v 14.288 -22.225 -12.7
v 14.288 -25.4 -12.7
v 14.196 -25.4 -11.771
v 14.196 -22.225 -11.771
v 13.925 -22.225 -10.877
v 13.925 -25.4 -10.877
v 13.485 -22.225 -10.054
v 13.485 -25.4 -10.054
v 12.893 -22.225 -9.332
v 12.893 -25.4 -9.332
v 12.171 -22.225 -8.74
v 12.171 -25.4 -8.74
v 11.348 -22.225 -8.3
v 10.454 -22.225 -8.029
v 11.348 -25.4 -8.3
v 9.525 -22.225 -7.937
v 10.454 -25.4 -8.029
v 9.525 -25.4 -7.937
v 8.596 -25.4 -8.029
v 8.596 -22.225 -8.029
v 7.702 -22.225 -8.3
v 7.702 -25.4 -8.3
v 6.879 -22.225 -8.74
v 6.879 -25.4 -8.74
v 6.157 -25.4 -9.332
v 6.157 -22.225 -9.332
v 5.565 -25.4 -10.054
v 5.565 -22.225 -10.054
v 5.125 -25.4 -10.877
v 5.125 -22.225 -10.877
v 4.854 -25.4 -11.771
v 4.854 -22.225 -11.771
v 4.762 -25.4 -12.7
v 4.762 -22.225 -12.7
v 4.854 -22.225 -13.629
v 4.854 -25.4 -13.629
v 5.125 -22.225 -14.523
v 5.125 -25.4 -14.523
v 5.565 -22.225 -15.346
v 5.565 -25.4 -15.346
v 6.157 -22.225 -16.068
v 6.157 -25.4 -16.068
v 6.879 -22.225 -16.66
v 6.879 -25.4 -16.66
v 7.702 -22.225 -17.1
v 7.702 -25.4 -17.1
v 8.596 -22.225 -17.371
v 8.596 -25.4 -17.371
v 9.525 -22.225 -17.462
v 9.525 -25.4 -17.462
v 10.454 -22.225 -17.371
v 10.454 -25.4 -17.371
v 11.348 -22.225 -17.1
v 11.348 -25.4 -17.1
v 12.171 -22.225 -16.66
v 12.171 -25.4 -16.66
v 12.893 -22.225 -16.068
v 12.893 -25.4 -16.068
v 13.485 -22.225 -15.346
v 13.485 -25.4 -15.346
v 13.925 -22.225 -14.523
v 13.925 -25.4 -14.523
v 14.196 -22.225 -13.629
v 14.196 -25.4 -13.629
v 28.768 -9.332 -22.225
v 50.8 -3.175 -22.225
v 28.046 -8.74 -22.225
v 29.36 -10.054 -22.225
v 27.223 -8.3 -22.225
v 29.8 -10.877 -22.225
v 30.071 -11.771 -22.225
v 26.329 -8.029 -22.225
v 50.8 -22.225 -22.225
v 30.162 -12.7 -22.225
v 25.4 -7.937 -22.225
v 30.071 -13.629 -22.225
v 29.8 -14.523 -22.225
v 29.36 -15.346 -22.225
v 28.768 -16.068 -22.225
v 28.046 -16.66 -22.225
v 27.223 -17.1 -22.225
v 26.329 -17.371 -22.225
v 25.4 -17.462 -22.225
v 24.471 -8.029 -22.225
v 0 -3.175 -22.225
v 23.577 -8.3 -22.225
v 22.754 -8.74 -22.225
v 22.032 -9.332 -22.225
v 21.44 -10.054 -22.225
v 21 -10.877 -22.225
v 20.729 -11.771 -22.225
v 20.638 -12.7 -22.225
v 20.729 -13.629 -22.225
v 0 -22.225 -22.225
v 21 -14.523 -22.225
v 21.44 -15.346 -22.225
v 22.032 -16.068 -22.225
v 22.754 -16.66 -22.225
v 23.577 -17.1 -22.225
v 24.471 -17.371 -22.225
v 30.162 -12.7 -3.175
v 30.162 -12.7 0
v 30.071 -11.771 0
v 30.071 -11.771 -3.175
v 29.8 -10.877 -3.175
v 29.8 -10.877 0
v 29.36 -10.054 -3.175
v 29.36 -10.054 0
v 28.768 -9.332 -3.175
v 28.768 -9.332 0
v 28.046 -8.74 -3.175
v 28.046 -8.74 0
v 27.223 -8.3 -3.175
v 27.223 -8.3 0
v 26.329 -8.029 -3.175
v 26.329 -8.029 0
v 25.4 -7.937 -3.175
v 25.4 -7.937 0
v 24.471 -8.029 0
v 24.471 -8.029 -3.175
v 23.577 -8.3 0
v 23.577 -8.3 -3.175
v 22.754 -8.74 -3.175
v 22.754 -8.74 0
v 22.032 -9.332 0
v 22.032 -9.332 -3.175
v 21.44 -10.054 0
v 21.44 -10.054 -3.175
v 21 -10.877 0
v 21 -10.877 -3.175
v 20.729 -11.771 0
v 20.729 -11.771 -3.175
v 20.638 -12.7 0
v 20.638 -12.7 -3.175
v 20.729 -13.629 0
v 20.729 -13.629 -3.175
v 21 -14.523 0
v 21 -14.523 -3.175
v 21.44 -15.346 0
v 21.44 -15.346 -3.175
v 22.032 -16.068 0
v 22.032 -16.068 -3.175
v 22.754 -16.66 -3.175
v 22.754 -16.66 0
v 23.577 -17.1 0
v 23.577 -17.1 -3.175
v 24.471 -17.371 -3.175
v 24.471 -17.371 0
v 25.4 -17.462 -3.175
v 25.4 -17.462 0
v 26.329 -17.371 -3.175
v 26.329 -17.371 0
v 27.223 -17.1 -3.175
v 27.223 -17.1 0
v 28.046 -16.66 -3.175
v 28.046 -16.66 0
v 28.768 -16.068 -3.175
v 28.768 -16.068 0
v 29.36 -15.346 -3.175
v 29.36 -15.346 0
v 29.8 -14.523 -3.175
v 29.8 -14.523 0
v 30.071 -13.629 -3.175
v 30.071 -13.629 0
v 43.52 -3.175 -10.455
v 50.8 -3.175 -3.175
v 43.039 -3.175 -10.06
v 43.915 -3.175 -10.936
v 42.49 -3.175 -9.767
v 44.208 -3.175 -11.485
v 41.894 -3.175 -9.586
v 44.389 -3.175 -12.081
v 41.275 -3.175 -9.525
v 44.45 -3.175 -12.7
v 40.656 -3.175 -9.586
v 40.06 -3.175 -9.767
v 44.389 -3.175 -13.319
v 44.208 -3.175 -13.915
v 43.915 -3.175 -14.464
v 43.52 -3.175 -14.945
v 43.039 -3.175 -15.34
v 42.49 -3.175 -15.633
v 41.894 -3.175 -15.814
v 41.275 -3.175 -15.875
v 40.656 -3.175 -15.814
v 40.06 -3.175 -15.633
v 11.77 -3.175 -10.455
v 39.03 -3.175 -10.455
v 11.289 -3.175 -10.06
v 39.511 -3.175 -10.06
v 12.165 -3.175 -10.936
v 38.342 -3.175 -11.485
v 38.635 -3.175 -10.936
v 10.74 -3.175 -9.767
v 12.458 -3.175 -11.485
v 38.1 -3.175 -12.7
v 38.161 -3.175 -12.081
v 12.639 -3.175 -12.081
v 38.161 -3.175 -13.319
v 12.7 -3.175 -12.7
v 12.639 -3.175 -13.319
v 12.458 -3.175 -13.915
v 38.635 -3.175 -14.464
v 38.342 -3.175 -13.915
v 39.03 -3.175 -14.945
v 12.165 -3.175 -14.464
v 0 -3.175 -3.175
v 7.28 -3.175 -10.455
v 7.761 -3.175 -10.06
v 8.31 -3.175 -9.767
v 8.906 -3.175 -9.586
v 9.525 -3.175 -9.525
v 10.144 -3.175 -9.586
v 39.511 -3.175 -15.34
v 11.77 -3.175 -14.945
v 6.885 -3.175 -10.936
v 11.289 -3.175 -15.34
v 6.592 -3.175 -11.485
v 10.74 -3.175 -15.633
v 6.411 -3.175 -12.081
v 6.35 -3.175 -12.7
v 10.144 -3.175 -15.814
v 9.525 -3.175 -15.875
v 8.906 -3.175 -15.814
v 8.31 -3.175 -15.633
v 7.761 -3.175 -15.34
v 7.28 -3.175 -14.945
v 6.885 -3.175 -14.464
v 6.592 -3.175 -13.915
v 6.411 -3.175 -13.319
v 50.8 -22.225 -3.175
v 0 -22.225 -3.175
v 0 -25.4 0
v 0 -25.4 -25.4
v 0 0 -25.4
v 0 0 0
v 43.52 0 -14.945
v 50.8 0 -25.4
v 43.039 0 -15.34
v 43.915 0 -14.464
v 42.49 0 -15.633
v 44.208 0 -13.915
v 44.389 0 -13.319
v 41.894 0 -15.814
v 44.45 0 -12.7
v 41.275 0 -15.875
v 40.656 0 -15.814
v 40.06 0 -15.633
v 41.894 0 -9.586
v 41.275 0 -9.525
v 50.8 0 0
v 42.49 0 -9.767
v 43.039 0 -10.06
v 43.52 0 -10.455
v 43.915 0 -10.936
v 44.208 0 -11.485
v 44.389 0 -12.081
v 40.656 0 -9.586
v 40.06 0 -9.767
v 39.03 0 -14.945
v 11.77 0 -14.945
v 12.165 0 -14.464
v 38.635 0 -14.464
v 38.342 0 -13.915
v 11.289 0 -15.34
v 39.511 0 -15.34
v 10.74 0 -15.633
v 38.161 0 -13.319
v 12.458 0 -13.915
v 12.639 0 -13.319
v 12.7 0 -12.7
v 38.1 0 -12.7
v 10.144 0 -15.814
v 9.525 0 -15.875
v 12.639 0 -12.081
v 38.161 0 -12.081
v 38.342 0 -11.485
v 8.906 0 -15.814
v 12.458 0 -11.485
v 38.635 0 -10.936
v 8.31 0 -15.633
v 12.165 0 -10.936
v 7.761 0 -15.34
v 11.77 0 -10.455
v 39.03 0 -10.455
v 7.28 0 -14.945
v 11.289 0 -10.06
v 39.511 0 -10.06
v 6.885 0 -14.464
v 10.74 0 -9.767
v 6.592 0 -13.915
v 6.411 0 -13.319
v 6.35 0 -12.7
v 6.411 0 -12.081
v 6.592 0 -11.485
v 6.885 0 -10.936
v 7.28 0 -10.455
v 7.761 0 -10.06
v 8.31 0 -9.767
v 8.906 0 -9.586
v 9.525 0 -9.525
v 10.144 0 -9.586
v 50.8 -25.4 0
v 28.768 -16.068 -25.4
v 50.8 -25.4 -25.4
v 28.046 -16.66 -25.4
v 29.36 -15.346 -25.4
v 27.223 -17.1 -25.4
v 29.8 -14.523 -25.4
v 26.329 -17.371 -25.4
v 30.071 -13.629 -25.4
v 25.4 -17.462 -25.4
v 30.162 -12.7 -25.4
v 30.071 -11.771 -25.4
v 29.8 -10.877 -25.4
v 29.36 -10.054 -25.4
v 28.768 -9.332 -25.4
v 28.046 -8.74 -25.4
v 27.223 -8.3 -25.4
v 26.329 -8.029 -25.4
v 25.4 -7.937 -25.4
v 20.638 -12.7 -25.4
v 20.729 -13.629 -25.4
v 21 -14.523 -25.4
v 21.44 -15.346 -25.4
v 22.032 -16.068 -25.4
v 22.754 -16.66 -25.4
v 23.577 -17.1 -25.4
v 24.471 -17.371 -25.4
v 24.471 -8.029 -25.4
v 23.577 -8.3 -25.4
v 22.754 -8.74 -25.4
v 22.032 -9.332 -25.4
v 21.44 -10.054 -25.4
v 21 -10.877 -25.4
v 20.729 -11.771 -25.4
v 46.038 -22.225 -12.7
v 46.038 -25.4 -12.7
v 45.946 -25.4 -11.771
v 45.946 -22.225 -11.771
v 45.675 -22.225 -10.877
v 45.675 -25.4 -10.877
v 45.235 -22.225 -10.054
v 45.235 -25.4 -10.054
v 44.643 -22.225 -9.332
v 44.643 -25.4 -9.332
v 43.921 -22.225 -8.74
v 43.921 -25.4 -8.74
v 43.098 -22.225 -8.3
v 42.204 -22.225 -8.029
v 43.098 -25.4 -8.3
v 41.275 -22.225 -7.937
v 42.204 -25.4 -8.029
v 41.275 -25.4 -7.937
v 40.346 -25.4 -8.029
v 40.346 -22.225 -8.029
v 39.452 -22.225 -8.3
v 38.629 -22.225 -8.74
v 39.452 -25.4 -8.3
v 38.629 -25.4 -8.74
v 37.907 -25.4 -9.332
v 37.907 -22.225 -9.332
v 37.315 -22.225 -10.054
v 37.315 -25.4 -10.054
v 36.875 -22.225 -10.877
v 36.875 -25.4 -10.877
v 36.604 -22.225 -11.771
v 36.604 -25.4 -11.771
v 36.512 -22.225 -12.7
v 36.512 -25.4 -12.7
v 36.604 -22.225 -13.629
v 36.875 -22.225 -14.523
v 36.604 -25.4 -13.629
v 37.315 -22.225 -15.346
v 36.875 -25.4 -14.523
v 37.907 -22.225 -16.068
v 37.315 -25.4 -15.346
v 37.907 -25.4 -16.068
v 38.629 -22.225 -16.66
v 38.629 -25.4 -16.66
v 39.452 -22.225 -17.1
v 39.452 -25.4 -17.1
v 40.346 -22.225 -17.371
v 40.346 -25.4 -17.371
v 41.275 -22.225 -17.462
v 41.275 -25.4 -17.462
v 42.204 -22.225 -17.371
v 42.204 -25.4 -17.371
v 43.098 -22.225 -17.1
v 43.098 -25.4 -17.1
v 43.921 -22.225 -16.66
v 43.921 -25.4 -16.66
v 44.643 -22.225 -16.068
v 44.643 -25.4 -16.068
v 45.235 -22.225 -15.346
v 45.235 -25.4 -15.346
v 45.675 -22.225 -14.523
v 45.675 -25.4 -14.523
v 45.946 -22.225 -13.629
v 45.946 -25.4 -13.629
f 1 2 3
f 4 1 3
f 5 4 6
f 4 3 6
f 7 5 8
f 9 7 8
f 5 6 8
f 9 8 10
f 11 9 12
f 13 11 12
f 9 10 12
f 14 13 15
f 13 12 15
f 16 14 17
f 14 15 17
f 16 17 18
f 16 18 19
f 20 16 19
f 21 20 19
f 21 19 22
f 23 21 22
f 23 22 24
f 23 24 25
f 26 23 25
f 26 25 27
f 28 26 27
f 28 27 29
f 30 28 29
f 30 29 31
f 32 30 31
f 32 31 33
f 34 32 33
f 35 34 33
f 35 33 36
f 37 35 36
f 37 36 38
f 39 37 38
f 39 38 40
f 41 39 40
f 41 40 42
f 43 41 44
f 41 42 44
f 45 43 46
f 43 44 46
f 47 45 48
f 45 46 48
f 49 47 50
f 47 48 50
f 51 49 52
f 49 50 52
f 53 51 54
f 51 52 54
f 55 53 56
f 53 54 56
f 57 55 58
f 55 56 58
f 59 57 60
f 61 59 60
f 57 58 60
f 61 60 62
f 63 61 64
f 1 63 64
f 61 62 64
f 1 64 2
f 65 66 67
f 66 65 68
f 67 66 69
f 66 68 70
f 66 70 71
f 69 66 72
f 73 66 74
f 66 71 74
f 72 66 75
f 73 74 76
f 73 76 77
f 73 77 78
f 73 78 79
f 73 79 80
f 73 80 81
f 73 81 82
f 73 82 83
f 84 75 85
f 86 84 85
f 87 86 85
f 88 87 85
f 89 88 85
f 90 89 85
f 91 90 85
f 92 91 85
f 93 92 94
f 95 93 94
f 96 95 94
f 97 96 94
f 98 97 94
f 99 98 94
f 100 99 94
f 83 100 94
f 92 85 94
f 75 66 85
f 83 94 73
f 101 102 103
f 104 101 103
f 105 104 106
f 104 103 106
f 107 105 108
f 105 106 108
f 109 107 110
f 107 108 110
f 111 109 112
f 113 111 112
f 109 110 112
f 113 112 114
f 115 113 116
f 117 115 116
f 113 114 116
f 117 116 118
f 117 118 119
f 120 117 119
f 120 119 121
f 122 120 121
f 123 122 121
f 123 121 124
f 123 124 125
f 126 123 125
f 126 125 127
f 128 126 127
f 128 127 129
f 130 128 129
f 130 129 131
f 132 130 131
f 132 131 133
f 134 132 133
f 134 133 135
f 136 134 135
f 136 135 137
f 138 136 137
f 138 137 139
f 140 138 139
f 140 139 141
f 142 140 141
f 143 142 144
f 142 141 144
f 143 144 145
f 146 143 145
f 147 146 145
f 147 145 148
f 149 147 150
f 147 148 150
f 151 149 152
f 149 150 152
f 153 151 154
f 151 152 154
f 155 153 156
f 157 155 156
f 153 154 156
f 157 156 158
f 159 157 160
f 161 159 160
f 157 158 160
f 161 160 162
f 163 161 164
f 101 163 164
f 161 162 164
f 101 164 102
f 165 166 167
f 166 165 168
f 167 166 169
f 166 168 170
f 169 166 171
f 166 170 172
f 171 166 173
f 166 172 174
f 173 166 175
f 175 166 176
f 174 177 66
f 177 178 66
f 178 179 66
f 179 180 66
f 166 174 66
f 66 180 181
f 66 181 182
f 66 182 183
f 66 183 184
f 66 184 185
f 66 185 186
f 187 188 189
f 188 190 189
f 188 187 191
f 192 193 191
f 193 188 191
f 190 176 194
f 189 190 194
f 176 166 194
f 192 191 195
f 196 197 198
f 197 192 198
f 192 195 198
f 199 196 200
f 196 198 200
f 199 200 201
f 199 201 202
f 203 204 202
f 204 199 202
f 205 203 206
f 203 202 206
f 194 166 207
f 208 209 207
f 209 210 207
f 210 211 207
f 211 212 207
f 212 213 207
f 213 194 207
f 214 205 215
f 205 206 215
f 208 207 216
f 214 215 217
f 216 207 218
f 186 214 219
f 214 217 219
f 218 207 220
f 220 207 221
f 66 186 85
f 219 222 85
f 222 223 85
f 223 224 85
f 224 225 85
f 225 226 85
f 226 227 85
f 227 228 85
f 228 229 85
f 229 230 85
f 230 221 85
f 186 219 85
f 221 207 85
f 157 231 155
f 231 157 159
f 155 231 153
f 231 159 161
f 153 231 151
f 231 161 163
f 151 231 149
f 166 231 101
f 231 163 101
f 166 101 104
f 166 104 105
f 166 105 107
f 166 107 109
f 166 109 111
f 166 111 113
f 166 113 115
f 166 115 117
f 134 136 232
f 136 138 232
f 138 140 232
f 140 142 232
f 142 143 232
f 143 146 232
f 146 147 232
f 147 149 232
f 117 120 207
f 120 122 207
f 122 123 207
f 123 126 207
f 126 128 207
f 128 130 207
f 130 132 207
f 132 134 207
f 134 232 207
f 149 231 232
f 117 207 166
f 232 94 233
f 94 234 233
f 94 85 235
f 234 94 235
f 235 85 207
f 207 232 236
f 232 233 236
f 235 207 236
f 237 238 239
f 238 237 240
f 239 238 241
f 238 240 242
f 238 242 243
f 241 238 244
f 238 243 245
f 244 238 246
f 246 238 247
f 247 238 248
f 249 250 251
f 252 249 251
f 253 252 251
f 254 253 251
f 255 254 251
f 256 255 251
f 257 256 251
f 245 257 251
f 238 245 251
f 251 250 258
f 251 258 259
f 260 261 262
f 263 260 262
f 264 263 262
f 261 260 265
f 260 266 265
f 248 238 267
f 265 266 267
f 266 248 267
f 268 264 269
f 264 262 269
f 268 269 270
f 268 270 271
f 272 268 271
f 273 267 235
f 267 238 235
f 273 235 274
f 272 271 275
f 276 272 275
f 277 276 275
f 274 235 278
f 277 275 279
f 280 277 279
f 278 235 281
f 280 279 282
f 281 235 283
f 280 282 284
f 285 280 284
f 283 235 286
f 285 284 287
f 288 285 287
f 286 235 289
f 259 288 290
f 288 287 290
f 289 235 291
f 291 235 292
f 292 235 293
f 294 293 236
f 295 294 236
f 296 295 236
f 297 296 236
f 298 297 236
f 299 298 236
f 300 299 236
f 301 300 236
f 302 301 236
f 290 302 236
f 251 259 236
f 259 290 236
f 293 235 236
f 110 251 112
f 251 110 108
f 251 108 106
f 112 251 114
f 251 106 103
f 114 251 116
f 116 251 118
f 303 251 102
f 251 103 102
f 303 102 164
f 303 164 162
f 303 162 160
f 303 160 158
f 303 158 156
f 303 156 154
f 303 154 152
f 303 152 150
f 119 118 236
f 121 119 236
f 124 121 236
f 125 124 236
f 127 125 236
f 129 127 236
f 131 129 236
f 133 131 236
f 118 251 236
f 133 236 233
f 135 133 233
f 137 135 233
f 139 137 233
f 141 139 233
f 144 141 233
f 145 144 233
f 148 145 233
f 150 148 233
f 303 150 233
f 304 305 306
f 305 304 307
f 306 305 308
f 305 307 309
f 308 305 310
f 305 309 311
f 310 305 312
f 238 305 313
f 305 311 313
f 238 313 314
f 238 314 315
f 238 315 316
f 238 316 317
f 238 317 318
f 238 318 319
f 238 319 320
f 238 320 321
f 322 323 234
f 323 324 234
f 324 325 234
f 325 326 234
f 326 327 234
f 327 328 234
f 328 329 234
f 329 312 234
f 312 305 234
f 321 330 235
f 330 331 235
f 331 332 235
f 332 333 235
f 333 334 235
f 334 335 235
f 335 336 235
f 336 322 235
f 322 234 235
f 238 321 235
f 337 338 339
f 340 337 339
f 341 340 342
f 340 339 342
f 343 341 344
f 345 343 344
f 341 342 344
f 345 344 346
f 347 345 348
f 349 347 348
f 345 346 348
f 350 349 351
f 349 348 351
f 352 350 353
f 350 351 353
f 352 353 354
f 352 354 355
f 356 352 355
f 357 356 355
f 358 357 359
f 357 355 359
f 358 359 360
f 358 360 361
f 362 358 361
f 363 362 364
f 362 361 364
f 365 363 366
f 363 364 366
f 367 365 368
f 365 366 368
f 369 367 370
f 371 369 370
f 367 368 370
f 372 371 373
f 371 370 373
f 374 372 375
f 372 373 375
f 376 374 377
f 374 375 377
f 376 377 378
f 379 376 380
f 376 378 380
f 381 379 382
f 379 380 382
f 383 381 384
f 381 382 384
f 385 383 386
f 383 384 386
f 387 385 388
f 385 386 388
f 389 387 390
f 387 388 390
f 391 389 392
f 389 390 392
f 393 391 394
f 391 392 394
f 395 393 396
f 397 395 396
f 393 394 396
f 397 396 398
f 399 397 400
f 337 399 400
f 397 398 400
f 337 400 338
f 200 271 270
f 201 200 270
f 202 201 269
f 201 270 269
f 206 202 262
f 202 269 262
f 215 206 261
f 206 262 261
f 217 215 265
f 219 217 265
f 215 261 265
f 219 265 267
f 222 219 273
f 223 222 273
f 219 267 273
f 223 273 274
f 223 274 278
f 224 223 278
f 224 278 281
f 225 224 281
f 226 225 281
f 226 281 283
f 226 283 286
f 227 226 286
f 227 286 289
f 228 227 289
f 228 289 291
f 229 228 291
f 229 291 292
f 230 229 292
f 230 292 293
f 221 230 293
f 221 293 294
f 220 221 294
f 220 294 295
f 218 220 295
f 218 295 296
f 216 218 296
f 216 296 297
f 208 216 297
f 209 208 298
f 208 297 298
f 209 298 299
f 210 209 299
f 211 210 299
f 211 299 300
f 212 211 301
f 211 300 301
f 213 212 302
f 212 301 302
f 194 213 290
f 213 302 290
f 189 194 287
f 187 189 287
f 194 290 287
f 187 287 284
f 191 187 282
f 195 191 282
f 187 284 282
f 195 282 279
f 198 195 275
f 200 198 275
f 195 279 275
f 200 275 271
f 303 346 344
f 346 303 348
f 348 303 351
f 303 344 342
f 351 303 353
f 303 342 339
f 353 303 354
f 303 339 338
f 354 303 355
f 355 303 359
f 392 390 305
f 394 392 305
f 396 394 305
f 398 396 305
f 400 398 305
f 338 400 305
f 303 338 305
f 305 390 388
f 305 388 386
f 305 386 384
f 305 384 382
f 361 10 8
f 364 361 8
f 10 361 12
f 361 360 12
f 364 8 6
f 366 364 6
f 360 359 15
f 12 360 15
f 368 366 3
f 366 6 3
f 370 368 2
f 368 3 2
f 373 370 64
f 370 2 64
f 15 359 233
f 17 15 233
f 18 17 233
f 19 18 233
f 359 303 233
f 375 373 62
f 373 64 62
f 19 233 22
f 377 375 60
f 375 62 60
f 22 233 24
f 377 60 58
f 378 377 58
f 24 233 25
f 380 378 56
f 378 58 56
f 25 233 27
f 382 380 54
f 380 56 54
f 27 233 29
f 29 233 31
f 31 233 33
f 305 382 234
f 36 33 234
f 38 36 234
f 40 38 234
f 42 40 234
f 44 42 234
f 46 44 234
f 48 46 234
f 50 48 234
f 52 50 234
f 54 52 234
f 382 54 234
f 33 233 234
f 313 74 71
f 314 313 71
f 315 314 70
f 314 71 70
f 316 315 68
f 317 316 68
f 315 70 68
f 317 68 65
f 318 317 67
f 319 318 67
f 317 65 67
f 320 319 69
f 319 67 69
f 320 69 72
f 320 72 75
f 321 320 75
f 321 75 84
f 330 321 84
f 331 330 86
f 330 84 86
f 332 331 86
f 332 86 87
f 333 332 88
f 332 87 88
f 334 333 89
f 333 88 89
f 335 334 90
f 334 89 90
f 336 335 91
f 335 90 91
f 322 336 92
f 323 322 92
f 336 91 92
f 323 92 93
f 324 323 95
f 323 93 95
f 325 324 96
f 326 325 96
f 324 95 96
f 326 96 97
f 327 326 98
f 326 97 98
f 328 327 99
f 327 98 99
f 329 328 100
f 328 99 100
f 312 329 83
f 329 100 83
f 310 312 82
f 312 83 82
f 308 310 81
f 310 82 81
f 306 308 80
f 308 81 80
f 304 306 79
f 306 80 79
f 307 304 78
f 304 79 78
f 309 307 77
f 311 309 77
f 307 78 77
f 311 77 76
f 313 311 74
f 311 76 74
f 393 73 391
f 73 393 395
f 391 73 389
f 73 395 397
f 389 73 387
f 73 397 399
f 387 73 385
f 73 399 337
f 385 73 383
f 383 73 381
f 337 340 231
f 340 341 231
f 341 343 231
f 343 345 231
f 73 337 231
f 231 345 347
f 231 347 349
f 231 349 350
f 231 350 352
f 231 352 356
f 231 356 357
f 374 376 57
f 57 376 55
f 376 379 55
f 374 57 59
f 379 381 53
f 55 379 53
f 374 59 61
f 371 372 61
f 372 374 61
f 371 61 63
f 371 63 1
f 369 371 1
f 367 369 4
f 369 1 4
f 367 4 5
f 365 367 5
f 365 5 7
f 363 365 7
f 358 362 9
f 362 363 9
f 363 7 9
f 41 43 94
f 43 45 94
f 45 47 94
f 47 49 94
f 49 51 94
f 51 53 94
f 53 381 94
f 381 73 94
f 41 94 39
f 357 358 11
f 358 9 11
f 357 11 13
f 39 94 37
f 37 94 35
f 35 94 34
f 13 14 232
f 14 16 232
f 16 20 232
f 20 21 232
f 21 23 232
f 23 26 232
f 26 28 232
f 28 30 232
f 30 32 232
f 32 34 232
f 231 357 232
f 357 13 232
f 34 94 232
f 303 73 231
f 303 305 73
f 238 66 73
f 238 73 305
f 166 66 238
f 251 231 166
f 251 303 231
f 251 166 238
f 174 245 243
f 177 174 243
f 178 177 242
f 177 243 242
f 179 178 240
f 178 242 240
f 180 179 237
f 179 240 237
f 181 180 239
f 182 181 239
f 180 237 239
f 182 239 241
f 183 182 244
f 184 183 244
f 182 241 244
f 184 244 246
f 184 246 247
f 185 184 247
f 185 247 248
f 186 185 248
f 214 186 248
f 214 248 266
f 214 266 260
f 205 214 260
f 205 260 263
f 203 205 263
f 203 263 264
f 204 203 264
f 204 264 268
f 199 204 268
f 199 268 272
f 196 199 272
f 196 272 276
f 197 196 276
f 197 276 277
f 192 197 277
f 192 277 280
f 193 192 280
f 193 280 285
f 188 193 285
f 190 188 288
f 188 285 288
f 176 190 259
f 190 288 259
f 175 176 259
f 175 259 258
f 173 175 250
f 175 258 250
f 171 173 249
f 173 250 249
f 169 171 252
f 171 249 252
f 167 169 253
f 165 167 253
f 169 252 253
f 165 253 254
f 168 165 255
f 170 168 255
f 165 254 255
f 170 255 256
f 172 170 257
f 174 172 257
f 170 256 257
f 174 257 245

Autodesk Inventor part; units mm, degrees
ref_plane "YZ Plane" through (0, 0, 0) normal (1, 0, 0) x (0, 1, 0)
ref_plane "XZ Plane" through (0, 0, 0) normal (0, 1, 0) x (-1, 0, 0)
ref_plane "XY Plane" through (0, 0, 0) normal (0, 0, 1) x (1, 0, 0)
sketch "Sketch1" plane through (0, 0, 0) normal (1, 0, 0) x (0, 1, 0)
  line L0 (0, 0) -> (-25.4, 0)
  line L1 (-25.4, 0) -> (-25.4, -25.4)
  line L2 (-25.4, -25.4) -> (0, -25.4)
  line L3 (0, -25.4) -> (0, 0)
  line L4 (-3.175, -22.225) -> (-22.225, -22.225)
  line L5 (-22.225, -22.225) -> (-22.225, -3.175)
  line L6 (-22.225, -3.175) -> (-3.175, -3.175)
  line L7 (-3.175, -3.175) -> (-3.175, -22.225)
  dimension "d0" = 25.4
  dimension "d1" = 25.4
  dimension "d2" = 3.175
extrude "Extrusion1" add sketch "Sketch1" along normal blind 50.8
sketch "Sketch2" plane through (0, -25.4, 0) normal (0, 0, 1) x (1, 0, 0)
  circle A0 centre (25.4, 12.7) radius 4.7625
  line L0 (0, 25.4) -> (50.8, 25.4) projected
  line L1 (0, 25.4) -> (0, 0) projected
  dimension "d5" = 9.525
  dimension "d6" = 12.7
  dimension "d7" = 25.4
extrude "Extrusion2" cut sketch "Sketch2" against normal blind 50.8
sketch "Sketch3" plane through (0, 0, 0) normal (0, 1, 0) x (1, 0, 0)
  circle A0 centre (41.275, 12.7) radius 3.175
  circle A1 centre (9.525, 12.7) radius 3.175
  line L0 (50.8, 25.4) -> (50.8, 0) projected
  line L1 (0, 25.4) -> (50.8, 25.4) projected
  line L2 (0, 22.225) -> (0, 3.175) projected
  point P0 (0, 0)
  dimension "d10" = 6.35
  dimension "d11" = 6.35
  dimension "d12" = 9.525
  dimension "d13" = 12.7
  dimension "d14" = 9.525
  dimension "d15" = 12.7
extrude "Extrusion3" cut sketch "Sketch3" against normal blind 3.175
sketch "Sketch4" plane through (0, -25.4, -25.4) normal (0, -1, 0) x (1, 0, 0)
  circle A0 centre (41.275, 12.7) radius 3.175 projected
  circle A1 centre (41.275, 12.7) radius 4.7625
  circle A2 centre (9.525, 12.7) radius 4.7625
  line L0 (0, 25.4) -> (0, 0) projected
  line L1 (0, 0) -> (50.8, 0) projected
  dimension "d18" = 9.525
  dimension "d19" = 9.525
  dimension "d20" = 9.525
  dimension "d21" = 12.7
extrude "Extrusion4" cut sketch "Sketch4" against normal blind 3.175 contours A0 | A1 | A2
properties part number "15102898-16-A-0202" material "Aluminum 6061"
